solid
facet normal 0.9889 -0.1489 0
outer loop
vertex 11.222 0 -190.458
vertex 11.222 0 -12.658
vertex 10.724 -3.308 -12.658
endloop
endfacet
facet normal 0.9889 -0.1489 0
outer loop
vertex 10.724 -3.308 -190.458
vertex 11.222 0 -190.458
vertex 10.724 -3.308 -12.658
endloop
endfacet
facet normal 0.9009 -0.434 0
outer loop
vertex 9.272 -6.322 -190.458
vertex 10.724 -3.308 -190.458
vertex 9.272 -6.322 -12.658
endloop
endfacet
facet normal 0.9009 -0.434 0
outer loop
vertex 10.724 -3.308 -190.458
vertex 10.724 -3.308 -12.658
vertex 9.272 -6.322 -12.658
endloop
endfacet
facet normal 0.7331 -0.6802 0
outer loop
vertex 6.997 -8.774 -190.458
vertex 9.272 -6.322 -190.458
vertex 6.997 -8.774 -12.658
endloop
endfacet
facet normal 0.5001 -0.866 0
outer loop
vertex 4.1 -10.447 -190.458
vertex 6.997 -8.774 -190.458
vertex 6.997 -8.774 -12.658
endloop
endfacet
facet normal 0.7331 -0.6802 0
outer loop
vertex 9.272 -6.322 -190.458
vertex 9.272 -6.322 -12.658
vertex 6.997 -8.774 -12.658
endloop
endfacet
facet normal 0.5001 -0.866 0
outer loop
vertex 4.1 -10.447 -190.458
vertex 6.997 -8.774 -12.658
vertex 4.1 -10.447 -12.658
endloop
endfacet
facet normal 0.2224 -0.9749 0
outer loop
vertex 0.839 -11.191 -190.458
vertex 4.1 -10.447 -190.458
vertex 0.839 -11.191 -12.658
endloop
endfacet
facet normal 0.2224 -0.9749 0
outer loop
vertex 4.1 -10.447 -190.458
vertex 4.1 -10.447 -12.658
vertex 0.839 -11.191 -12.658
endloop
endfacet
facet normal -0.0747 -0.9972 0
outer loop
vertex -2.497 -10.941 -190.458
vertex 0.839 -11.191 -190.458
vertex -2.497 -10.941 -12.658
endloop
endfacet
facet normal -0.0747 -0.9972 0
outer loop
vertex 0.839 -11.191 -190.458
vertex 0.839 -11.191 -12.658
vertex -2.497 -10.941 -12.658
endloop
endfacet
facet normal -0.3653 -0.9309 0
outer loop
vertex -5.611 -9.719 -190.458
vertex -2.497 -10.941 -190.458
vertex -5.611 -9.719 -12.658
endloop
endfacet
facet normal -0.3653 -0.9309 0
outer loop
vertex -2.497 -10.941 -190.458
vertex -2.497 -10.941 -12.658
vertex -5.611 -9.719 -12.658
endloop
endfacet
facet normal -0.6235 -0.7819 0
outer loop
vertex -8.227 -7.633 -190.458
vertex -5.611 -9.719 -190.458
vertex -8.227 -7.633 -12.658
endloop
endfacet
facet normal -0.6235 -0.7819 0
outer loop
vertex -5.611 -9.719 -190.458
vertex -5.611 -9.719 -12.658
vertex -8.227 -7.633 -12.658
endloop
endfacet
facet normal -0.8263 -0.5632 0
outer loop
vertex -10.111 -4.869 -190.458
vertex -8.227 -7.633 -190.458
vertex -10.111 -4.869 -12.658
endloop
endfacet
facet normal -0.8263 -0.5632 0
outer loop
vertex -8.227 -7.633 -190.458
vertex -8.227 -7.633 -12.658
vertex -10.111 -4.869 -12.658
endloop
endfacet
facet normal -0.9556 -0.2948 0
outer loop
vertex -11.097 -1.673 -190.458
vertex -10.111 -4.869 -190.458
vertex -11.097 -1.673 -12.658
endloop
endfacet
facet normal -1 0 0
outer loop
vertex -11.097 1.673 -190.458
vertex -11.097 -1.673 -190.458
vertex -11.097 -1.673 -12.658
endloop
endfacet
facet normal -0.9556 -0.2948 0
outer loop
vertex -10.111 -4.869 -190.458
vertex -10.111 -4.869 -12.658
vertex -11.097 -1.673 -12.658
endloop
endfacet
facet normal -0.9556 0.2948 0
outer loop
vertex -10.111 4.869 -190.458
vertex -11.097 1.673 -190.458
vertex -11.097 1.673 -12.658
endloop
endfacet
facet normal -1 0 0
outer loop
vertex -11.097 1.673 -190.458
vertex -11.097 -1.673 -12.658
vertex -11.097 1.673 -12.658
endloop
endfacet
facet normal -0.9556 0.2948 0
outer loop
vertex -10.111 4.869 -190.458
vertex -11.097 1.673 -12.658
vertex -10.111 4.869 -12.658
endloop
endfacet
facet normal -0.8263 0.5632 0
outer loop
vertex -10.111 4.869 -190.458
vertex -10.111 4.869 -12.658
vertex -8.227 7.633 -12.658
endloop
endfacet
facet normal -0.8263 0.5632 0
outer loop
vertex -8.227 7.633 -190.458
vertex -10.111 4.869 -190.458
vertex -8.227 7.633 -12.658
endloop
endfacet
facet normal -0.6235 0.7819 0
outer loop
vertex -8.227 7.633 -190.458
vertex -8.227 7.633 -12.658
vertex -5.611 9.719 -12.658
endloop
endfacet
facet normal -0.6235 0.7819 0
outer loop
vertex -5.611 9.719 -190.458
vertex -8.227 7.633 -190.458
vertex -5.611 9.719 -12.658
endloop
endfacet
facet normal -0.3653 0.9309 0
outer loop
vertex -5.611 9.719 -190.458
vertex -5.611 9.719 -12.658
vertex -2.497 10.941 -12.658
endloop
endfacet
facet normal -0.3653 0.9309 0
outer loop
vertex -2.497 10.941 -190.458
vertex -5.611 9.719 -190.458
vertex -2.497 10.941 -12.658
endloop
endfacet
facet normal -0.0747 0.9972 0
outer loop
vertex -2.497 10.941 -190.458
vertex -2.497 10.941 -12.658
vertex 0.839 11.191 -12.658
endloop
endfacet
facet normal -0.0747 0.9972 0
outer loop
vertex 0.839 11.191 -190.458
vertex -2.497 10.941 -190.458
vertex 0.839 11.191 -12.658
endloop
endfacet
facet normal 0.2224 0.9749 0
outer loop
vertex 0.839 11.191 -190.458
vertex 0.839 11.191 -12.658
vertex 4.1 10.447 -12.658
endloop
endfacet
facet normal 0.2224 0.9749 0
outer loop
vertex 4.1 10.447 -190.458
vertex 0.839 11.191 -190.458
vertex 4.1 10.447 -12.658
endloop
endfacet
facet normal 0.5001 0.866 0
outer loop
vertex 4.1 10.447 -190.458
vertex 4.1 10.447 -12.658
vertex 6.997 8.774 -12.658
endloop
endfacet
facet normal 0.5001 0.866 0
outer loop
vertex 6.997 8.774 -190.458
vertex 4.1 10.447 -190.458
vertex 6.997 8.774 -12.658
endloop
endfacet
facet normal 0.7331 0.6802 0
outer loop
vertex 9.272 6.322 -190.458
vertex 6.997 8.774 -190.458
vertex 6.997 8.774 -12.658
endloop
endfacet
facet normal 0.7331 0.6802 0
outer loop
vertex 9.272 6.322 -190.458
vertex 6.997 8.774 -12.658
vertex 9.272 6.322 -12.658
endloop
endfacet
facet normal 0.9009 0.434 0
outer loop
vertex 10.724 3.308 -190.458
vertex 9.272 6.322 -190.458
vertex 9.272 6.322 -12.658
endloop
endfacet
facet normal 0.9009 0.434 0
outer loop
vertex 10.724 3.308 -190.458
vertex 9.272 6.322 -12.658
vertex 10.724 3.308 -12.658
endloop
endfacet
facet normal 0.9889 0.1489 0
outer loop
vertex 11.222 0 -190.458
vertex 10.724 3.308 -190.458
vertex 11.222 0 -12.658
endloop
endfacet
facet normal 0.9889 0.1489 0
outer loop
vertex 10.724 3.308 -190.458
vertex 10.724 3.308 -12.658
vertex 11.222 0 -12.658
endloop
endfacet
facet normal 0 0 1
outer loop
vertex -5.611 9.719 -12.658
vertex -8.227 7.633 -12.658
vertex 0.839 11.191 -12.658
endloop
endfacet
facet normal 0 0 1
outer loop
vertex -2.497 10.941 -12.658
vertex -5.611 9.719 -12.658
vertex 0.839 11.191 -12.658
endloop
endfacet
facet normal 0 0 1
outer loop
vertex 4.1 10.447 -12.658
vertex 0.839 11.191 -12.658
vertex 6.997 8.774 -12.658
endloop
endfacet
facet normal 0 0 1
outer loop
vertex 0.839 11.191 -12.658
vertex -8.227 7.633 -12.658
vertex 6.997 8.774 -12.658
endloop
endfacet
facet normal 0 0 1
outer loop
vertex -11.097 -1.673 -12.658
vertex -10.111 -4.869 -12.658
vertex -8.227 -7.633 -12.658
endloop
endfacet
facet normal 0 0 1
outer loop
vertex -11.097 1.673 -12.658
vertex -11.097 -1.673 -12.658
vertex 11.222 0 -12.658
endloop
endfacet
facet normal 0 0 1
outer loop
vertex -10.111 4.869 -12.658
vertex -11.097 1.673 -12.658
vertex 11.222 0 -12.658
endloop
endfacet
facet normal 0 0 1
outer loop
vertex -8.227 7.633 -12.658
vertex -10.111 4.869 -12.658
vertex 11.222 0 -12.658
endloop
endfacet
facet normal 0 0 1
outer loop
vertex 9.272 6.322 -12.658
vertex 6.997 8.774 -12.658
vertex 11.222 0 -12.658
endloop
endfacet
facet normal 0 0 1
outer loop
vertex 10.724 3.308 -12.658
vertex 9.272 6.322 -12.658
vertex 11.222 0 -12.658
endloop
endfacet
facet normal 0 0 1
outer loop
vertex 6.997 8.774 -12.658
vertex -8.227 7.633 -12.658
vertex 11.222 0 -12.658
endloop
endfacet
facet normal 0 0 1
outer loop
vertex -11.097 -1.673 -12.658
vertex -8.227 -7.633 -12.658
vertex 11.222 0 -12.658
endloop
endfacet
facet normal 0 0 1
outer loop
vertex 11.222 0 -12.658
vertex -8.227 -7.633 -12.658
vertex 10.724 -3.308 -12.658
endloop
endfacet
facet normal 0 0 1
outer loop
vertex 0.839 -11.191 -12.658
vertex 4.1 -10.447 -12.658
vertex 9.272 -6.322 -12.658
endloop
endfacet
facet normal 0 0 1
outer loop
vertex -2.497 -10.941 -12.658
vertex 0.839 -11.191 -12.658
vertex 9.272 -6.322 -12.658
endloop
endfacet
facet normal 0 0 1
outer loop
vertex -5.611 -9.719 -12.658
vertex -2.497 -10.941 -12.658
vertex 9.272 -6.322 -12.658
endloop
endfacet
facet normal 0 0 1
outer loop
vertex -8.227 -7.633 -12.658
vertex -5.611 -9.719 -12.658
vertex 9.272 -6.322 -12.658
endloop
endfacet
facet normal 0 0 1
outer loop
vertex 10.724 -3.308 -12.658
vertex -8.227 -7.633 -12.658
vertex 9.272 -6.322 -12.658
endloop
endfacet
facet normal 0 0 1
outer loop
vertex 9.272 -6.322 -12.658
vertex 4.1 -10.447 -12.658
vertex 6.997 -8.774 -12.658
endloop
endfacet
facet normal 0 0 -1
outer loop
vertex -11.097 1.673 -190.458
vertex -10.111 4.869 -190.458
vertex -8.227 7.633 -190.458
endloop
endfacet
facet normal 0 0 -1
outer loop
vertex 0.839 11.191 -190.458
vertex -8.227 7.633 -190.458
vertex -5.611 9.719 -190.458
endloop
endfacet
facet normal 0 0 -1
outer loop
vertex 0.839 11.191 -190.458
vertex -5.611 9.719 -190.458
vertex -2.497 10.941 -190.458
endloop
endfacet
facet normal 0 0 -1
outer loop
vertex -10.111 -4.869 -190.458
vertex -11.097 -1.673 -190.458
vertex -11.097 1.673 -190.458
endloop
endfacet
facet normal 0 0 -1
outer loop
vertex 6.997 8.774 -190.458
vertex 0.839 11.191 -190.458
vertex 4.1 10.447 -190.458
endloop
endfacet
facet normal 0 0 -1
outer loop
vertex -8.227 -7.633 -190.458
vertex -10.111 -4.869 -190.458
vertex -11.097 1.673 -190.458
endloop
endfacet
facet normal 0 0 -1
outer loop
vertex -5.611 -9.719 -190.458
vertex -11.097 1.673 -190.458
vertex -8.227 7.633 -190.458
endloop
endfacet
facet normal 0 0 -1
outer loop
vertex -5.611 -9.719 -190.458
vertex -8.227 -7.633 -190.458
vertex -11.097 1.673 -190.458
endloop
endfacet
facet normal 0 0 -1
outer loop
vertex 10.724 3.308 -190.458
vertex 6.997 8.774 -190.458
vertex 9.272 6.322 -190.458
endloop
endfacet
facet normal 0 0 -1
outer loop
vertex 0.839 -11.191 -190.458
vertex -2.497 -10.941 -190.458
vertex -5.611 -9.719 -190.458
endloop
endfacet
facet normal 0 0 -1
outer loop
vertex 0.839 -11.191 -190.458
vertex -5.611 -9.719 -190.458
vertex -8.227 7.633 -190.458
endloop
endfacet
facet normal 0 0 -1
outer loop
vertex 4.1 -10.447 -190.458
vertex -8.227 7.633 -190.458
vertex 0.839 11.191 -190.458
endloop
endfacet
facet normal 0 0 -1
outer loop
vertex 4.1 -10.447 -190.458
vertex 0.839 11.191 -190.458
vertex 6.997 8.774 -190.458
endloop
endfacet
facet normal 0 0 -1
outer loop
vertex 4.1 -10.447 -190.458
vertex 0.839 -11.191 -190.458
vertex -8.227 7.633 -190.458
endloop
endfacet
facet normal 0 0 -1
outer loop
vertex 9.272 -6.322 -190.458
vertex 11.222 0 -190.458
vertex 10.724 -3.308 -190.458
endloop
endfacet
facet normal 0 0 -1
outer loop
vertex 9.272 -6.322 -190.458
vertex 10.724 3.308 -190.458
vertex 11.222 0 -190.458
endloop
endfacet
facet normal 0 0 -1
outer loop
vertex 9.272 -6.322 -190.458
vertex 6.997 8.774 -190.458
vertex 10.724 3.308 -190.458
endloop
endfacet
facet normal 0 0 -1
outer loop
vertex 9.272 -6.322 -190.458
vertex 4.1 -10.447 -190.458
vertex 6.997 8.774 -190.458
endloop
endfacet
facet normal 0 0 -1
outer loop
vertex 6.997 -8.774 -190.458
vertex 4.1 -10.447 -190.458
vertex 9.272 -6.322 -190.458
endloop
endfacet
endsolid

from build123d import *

# Parameters (mm, degrees)
F0_W     = 107.8754812479
F0_H     = 26.1090872809
F1_DEPTH = 12.7
F2_DEPTH = 12.7
F3_R     = 11.2223896829
F4_DEPTH = 177.8
F5_DEPTH = 25.4


with BuildPart() as f1:
    # F0 (on Front) → F1 (new body)
    with BuildSketch(Plane.XZ):
        with Locations((0.7920116186, 0.3961385228)):
            Rectangle(F0_W, F0_H)
    extrude(amount=F1_DEPTH)

    # F2 (add): a face of the model
    f2_faces = [f1.faces().sort_by_distance(p)[0] for p in [
        (0.7920116186, 0, 0.3961385228),
    ]]
    extrude(f2_faces, amount=F2_DEPTH)

    # F3 (on face) → F4 (join)
    with BuildSketch(Plane(origin=(0, 0, -12.6584051177), x_dir=(1, 0, 0), z_dir=(0, 0, -1))):
        Circle(F3_R)
    extrude(amount=F4_DEPTH)

    # F5 (cut): a face of the model
    f5_faces = [f1.faces().sort_by_distance(p)[0] for p in [
        (0.7920116186, -12.7, 0.3961385228),
    ]]
    extrude(f5_faces, amount=-F5_DEPTH, mode=Mode.SUBTRACT)


solid = f1.part
